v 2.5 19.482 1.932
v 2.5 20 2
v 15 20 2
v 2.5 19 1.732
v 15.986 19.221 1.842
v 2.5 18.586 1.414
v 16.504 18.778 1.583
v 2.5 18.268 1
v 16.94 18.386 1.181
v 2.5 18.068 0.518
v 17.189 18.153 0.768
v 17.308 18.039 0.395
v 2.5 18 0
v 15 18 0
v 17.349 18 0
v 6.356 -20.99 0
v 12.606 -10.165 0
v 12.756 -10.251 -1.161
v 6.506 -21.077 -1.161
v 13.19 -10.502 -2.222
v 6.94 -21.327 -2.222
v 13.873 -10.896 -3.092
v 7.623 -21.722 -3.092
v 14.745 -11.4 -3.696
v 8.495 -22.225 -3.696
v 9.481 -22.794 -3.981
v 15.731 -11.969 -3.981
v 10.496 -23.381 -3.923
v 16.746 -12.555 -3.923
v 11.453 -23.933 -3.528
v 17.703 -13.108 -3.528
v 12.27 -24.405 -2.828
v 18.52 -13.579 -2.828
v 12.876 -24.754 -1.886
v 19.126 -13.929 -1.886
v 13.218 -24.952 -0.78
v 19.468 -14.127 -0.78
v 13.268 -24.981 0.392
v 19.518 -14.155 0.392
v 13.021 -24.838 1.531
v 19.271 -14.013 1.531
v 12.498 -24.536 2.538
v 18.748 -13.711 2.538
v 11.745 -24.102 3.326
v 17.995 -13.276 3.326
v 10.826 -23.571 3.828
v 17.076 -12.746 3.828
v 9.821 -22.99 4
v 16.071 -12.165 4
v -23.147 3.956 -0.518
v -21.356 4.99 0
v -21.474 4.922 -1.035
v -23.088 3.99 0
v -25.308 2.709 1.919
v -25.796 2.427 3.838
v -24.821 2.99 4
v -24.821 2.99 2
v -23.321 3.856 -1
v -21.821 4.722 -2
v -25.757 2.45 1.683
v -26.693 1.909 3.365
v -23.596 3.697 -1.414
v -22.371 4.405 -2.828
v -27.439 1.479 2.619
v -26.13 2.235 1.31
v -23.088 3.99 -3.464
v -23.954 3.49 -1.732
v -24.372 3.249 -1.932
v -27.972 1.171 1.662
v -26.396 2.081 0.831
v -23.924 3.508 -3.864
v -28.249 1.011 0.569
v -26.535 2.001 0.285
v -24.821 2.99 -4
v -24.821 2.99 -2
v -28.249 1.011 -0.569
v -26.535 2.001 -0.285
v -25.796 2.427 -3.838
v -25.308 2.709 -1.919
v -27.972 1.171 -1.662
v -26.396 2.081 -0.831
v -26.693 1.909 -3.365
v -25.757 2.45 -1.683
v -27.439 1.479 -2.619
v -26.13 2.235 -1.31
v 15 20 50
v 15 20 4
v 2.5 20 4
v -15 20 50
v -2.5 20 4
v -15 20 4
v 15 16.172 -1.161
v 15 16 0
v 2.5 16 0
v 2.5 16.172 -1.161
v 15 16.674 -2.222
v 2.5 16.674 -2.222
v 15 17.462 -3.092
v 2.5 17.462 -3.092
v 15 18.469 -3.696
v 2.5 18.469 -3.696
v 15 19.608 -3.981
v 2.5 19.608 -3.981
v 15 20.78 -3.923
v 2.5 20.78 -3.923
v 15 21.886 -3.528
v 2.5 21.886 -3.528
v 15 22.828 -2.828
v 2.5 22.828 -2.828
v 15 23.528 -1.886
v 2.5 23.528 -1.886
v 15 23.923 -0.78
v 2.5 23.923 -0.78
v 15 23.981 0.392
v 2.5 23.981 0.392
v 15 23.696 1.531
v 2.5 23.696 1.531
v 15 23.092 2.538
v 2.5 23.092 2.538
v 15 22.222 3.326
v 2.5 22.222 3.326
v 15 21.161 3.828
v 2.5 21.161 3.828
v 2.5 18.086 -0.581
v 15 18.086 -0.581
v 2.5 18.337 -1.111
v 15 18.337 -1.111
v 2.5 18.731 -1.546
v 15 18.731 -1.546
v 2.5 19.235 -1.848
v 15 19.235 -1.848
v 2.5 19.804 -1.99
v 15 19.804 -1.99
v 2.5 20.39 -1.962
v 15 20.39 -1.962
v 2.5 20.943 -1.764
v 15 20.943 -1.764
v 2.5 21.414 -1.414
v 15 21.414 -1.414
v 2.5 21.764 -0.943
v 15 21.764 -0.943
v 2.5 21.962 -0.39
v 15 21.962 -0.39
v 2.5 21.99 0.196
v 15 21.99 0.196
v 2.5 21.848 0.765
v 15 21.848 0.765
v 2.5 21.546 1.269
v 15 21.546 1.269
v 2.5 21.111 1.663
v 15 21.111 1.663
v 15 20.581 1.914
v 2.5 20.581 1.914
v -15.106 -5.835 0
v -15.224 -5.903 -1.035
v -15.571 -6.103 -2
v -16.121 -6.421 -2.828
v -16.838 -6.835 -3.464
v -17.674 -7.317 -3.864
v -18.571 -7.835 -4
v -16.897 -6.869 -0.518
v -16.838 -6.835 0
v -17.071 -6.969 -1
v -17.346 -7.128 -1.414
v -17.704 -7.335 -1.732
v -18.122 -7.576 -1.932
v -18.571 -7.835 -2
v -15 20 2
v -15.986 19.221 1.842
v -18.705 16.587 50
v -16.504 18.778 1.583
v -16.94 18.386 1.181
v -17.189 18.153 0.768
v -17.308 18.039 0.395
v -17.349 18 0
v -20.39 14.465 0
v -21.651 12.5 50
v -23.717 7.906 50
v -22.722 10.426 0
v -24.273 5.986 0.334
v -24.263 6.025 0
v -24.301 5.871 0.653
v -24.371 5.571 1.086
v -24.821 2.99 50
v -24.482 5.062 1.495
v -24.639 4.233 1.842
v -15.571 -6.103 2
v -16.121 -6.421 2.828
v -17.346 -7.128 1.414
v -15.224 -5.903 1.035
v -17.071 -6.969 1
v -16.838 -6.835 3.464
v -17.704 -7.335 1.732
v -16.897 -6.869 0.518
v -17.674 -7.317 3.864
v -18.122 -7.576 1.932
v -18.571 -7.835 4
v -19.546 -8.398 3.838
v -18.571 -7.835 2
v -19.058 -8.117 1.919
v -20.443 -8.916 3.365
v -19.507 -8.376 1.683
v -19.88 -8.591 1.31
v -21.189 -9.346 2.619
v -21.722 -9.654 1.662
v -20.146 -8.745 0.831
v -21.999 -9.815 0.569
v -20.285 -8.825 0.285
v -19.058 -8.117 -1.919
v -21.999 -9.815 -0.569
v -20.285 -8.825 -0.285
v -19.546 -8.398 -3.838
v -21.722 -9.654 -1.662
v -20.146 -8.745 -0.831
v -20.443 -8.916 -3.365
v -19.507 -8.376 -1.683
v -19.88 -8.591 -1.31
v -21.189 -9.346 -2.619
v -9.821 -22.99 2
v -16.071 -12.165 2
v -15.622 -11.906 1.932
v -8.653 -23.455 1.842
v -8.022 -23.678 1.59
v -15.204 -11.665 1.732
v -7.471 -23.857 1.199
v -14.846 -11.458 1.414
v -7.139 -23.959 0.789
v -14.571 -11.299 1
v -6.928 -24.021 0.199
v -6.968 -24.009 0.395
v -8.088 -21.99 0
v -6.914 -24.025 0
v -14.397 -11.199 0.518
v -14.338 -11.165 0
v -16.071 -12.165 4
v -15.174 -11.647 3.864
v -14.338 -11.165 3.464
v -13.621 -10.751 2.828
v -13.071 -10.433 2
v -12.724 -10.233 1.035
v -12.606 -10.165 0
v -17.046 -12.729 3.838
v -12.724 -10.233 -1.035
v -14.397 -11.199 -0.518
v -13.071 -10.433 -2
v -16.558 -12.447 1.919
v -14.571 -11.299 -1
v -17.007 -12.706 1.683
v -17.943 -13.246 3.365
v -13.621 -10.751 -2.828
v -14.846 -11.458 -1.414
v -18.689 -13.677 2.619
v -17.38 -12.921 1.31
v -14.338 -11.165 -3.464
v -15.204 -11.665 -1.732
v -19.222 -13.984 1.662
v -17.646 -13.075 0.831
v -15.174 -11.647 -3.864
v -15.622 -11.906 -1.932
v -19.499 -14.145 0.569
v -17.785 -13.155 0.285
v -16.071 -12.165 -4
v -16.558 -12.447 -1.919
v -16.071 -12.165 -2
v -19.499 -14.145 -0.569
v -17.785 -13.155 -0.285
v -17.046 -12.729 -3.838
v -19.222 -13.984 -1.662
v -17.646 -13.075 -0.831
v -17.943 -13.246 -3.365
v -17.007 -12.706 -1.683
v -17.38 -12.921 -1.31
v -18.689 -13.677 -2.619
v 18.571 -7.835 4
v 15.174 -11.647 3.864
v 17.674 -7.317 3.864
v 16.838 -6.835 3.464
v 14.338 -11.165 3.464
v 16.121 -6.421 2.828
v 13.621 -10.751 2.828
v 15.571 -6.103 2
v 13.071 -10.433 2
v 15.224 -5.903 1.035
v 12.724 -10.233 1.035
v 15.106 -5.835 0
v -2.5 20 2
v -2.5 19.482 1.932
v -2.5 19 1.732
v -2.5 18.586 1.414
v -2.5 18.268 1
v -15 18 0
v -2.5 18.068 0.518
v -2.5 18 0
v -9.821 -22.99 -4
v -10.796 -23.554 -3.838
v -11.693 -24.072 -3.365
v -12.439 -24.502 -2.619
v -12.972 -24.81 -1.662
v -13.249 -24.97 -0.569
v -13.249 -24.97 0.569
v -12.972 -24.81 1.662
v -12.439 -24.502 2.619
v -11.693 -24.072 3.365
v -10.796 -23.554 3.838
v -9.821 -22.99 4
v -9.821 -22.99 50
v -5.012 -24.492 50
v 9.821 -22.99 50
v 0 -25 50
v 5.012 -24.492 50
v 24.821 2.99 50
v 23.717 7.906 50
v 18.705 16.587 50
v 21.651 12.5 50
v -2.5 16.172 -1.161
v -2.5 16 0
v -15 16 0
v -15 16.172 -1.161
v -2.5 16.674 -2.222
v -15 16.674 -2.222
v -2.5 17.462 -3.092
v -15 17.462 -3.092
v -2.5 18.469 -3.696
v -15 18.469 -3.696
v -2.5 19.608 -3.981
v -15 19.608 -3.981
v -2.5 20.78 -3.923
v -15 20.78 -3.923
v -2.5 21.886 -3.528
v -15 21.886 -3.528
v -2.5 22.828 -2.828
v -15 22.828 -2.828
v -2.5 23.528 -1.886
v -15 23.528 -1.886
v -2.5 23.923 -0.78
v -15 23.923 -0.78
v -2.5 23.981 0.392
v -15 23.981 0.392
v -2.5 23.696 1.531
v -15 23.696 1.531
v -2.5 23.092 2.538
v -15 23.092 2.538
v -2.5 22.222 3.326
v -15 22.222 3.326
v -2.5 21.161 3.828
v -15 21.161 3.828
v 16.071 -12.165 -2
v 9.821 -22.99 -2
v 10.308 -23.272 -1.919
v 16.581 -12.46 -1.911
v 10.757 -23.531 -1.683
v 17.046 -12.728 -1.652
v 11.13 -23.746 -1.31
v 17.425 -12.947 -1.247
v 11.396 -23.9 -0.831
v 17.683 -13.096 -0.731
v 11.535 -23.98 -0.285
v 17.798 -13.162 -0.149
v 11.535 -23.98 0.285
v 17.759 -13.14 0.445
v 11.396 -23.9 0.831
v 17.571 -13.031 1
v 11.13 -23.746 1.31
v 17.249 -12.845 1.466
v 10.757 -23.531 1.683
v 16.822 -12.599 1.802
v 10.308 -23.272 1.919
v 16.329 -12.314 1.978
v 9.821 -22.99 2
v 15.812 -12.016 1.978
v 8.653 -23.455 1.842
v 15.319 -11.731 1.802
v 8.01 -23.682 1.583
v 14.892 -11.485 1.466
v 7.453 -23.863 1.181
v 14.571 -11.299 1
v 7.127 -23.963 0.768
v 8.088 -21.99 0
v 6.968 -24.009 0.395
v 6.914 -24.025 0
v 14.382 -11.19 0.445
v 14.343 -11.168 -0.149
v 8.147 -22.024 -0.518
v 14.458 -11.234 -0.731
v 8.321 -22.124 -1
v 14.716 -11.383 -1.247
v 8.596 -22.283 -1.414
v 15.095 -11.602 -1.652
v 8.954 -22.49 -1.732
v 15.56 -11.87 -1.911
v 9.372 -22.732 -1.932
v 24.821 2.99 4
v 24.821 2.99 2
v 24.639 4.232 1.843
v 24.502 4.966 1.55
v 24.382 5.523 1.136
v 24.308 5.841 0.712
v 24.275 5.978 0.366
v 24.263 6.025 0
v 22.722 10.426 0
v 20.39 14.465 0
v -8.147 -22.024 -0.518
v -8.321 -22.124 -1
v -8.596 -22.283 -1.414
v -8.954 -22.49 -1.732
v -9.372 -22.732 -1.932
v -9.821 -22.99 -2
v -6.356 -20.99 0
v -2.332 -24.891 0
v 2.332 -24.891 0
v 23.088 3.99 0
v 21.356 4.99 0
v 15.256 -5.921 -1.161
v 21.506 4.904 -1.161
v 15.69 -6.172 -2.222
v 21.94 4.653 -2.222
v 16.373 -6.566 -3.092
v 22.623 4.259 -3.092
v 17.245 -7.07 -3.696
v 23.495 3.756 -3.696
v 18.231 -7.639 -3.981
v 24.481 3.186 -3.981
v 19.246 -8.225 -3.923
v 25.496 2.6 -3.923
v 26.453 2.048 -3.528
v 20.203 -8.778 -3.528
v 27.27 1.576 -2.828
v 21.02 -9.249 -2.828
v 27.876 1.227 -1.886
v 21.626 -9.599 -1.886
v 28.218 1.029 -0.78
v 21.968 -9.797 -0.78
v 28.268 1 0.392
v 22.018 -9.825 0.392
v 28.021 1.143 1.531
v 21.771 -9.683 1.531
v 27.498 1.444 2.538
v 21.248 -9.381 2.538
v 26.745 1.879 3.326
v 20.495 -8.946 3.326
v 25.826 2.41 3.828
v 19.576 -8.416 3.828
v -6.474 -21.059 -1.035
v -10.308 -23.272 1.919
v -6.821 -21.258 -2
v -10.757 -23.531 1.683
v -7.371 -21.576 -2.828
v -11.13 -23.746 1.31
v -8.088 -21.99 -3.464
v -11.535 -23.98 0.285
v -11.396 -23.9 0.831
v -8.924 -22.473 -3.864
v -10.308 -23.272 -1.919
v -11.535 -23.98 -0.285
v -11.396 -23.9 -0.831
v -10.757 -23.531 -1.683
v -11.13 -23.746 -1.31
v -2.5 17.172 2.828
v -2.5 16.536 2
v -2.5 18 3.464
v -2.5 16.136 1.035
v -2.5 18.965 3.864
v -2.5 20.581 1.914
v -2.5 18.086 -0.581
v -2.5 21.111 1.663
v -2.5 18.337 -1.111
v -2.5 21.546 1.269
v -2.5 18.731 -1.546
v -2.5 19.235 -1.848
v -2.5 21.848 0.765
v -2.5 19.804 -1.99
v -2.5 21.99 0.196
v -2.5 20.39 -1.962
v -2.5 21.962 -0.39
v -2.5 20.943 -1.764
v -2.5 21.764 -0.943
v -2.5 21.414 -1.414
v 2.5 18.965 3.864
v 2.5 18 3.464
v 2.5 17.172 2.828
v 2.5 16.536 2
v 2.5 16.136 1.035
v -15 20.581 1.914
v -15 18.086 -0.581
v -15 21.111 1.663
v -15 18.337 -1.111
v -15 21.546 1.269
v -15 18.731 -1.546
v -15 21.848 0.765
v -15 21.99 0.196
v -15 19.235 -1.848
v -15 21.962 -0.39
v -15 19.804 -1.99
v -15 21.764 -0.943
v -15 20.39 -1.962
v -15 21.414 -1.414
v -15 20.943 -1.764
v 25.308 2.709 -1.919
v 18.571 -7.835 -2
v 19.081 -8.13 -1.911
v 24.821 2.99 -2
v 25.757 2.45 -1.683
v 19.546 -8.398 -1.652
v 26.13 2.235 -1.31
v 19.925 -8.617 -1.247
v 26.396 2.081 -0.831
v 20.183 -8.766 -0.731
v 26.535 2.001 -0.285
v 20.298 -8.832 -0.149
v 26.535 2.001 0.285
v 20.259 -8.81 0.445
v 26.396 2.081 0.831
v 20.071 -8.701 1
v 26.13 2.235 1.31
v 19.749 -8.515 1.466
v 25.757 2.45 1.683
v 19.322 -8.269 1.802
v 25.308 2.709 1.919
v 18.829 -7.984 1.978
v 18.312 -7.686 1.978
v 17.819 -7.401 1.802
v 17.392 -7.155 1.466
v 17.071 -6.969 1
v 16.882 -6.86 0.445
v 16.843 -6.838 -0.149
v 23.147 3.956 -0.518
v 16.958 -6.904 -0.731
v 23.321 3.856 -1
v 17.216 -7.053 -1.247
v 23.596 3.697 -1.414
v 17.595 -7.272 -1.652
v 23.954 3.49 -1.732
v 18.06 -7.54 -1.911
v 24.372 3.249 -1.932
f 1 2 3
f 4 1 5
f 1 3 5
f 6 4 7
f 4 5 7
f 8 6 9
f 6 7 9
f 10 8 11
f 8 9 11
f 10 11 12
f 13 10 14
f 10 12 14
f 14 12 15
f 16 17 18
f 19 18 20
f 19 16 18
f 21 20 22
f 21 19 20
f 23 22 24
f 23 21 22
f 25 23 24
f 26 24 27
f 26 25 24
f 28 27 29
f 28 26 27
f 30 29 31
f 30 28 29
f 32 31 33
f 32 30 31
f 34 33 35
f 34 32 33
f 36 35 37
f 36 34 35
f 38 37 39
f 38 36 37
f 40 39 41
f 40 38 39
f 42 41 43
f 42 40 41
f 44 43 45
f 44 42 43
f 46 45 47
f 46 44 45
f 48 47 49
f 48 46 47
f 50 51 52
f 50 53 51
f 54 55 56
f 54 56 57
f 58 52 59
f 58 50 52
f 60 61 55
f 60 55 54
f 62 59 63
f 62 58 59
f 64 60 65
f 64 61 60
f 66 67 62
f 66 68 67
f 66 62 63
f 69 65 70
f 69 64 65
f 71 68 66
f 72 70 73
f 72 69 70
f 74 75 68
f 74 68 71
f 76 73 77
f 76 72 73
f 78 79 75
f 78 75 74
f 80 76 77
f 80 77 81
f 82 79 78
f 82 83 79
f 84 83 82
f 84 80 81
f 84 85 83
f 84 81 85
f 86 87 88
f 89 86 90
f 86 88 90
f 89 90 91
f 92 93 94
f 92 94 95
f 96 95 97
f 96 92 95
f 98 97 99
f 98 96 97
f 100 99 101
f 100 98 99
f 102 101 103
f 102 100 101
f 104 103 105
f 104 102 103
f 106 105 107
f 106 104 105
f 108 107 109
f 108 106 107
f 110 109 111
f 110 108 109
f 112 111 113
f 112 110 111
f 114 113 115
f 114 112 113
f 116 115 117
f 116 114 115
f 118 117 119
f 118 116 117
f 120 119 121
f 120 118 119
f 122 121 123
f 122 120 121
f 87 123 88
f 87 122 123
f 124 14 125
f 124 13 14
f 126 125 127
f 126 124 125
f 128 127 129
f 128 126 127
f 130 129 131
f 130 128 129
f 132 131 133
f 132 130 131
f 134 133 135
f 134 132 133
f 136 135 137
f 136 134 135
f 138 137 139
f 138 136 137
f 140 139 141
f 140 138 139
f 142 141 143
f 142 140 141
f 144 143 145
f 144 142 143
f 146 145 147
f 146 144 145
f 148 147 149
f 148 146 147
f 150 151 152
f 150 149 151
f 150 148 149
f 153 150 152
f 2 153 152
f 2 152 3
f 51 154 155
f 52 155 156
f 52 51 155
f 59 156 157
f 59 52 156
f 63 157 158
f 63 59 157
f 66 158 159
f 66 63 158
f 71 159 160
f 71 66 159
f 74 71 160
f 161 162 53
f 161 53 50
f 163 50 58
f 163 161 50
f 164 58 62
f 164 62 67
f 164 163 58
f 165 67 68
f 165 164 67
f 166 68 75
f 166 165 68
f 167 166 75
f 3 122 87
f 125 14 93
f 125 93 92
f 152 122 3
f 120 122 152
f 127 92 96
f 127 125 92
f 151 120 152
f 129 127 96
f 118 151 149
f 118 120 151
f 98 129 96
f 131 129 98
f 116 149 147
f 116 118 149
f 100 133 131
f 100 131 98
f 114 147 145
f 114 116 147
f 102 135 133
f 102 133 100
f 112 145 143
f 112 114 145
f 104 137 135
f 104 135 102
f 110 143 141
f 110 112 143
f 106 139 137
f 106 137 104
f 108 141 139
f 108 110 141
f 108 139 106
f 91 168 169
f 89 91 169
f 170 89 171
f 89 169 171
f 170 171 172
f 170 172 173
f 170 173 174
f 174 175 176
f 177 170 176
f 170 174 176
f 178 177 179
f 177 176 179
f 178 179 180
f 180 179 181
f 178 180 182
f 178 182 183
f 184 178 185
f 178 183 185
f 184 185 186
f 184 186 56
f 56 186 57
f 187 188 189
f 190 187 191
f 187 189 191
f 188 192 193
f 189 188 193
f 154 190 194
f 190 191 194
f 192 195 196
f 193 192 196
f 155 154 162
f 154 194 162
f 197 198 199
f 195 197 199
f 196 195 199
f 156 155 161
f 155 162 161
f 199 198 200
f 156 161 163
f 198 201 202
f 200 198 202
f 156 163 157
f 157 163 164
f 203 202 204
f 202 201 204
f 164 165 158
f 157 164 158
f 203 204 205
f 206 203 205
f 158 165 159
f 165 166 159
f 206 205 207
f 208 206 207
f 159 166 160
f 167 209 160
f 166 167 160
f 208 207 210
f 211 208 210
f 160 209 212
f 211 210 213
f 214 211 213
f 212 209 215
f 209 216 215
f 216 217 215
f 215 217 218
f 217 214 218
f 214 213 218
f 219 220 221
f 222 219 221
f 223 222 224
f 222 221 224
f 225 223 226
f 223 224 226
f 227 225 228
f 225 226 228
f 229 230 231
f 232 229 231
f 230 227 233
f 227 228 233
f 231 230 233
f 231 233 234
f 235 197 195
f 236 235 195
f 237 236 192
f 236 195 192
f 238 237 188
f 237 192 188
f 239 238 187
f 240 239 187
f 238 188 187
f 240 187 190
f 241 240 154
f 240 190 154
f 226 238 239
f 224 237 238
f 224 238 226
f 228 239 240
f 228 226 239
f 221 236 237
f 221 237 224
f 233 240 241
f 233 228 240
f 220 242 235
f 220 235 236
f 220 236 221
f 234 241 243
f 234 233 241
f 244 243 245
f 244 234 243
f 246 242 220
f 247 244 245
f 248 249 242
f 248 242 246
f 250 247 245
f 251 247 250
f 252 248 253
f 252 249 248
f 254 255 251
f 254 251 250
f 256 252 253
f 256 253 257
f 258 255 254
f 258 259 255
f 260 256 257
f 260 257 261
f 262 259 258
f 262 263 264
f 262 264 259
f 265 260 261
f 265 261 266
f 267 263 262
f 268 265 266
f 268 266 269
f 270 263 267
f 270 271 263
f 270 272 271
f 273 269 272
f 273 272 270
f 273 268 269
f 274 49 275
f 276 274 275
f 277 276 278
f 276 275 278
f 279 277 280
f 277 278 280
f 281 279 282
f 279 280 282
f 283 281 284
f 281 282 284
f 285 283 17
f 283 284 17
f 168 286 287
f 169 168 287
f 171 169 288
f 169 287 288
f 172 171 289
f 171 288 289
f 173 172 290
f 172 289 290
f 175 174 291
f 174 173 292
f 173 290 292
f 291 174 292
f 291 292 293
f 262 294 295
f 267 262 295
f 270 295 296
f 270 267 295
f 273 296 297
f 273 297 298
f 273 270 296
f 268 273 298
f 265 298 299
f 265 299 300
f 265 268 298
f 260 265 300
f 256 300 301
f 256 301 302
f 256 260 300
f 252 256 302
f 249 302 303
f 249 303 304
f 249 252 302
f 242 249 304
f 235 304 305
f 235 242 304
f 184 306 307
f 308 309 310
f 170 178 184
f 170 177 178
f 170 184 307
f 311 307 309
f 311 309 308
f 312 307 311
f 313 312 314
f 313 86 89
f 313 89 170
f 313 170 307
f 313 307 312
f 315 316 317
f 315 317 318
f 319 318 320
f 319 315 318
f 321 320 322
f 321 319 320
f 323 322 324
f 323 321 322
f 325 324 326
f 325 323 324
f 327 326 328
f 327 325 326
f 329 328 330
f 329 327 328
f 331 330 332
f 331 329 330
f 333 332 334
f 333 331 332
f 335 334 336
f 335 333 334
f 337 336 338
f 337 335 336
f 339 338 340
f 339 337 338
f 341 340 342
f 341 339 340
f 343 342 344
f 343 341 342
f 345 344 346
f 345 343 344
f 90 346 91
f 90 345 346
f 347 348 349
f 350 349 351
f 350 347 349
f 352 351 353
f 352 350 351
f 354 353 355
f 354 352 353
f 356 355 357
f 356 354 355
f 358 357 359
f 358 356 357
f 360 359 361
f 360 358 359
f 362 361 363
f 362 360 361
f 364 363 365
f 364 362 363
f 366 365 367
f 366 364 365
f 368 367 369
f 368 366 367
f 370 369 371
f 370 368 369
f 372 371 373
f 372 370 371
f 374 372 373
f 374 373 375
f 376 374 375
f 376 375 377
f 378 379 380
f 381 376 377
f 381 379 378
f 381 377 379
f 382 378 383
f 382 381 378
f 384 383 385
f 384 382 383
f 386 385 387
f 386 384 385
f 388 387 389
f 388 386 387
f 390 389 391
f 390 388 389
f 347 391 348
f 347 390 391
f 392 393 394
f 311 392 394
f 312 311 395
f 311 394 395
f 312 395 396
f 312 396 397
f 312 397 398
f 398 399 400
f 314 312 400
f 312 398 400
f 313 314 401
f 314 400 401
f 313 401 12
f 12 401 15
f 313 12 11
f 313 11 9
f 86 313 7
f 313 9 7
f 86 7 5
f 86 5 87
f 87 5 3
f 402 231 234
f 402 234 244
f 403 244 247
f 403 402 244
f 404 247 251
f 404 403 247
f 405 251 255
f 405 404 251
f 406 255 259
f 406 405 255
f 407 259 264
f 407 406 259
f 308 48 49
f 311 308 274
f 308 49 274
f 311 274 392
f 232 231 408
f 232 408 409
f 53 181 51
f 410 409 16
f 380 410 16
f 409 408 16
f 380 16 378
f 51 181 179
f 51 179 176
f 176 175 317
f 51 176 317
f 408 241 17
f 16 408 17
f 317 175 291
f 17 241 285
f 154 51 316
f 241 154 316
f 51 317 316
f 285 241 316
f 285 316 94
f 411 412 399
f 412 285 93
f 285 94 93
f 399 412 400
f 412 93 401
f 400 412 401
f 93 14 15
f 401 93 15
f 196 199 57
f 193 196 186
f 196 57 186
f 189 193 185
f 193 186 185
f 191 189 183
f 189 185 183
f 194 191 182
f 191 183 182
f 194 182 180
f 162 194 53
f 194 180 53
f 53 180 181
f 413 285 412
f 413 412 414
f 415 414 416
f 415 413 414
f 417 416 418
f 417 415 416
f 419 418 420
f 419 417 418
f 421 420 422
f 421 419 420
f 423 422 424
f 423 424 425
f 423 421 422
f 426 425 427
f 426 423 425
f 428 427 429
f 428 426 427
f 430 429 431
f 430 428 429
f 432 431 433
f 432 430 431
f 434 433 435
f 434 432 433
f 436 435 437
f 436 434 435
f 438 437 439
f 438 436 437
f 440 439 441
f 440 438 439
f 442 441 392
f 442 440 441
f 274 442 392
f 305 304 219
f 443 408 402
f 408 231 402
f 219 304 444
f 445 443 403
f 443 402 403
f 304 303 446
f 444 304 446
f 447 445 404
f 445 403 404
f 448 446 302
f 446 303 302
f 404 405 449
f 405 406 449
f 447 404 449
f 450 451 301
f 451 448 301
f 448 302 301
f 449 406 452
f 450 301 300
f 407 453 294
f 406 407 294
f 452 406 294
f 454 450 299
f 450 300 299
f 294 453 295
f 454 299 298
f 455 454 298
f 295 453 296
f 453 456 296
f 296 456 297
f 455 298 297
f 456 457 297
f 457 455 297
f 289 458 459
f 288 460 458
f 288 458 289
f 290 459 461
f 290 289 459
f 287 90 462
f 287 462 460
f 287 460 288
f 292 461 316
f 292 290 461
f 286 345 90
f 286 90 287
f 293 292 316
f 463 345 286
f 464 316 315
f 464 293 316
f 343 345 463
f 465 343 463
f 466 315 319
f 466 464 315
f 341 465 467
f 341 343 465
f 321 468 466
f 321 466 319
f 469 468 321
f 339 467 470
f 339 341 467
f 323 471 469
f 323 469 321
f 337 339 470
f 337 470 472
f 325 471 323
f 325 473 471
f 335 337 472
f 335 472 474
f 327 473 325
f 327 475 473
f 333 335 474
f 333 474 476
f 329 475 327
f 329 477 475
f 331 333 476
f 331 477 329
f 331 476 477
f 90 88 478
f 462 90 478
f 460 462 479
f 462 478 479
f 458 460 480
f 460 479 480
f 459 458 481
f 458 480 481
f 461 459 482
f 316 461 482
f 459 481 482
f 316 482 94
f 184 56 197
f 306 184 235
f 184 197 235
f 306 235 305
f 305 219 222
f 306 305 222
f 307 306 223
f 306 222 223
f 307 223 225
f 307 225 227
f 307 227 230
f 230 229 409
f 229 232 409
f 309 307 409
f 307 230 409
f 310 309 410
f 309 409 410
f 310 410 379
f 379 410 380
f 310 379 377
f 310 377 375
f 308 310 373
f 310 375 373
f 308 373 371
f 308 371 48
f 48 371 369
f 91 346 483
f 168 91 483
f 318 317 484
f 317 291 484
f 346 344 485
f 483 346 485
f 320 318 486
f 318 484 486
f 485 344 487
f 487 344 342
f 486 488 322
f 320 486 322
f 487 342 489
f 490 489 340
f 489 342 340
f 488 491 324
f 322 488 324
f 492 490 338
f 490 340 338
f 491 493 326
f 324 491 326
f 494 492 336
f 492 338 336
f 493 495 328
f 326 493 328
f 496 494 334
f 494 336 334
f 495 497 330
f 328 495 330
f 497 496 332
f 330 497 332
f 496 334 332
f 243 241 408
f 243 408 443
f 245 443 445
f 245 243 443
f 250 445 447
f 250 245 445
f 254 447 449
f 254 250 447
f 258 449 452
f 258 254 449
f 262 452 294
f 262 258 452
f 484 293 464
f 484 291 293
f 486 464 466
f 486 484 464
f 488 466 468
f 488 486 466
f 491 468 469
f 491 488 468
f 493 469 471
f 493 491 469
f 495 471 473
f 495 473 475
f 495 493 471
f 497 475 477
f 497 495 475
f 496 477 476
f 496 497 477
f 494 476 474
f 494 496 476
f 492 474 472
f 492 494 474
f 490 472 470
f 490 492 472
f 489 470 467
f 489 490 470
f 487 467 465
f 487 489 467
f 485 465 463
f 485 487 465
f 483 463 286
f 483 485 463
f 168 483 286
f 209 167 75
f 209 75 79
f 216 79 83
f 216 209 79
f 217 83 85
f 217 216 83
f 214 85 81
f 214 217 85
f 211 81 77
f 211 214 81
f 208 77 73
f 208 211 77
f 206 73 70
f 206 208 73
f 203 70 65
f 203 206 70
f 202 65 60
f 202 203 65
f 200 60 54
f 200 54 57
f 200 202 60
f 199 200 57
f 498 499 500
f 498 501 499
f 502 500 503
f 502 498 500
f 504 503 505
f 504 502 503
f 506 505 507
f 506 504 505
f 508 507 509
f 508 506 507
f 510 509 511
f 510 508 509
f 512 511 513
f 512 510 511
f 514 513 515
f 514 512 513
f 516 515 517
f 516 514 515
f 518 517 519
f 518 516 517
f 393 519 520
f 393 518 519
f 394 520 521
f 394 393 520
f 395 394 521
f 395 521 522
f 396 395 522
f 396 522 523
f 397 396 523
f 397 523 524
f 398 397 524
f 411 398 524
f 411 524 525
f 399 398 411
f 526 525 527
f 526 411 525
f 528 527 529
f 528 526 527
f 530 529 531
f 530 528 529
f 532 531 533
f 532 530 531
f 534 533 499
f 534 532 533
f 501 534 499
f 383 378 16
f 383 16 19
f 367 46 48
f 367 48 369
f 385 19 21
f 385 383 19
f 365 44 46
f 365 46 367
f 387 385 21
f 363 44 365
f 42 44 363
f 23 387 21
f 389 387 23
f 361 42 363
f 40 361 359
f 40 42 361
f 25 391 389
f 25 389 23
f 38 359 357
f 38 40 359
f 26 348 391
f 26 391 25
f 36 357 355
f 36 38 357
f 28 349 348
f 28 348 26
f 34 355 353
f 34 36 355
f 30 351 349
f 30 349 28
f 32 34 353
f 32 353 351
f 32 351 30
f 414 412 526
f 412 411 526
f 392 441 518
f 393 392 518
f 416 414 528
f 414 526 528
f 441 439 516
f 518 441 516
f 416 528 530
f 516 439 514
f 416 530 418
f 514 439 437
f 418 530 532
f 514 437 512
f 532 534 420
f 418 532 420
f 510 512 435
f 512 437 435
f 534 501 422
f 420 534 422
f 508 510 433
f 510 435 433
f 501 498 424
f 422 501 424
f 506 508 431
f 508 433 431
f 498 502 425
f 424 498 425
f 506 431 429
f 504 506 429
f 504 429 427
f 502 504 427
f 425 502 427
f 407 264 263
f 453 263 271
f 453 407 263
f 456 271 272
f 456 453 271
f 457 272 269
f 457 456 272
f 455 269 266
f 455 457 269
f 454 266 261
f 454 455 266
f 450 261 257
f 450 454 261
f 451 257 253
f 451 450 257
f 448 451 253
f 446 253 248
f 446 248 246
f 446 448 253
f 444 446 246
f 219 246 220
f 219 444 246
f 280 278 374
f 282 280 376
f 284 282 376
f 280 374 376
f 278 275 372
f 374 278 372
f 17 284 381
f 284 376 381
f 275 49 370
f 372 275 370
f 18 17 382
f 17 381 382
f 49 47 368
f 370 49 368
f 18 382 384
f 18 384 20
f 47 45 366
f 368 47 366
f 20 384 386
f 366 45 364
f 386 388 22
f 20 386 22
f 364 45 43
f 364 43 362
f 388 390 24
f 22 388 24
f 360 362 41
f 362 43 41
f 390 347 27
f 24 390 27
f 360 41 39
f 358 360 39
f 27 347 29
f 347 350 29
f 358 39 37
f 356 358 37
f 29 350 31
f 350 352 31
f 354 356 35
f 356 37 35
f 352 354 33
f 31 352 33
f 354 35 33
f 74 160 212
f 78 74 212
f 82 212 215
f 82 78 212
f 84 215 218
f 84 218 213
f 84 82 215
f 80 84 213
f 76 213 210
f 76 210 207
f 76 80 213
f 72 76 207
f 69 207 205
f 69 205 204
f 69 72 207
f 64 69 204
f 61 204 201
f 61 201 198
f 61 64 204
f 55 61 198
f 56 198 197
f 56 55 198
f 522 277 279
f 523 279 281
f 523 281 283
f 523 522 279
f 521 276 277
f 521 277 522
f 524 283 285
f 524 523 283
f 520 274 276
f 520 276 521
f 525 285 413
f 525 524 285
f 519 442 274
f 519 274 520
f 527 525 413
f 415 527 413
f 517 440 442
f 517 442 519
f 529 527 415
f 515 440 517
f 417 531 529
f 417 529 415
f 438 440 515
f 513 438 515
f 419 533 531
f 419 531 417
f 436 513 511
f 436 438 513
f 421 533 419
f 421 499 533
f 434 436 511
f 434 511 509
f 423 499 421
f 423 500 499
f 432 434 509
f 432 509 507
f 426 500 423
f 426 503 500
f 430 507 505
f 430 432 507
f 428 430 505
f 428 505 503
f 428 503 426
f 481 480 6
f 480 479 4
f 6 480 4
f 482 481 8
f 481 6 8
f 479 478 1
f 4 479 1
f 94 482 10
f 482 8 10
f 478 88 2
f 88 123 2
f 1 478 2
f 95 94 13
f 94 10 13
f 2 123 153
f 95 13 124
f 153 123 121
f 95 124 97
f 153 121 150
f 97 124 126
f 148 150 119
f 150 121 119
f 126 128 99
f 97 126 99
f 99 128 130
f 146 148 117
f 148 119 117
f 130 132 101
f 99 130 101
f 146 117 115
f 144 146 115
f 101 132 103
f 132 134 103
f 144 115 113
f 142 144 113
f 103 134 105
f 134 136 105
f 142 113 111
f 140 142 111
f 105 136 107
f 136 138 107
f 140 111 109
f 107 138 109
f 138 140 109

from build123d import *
from build123d.topology import SkipClean

# Parameters (mm, degrees)
CROQUIS1_R              = 25
SALIENTE_EXTRUIR1_DEPTH = 50
CORTAR_EXTRUIR1_DEPTH   = 50
MATRIZC2_COUNT          = 3
CROQUIS4_R              = 4
CROQUIS4_R_2            = 2
SALIENTE_EXTRUIR2_DEPTH = 15
CROQUIS4_2_R            = 2
CORTAR_EXTRUIR3_DEPTH   = 20
MATRIZC3_COUNT          = 3
MATRIZC4_COUNT          = 3
CROQUIS4_3_R            = 4
CROQUIS4_3_R_2          = 2
CORTAR_EXTRUIR4_DEPTH   = 2.5
MATRIZC5_COUNT          = 3


with BuildPart() as part:
    # Croquis1 → Saliente-Extruir1 (new body)
    with BuildSketch(Plane.XY):
        Circle(CROQUIS1_R)
    extrude(amount=SALIENTE_EXTRUIR1_DEPTH)

    # Croquis2 → Cortar-Extruir1 (cut)
    with BuildSketch(Plane(origin=(0, 0, 0), x_dir=(-1, 0, 0), z_dir=(0, 0, -1))):
        with BuildLine():
            Line((-15, 20), (15, 20))
            ThreePointArc((15, 20), (0, 25), (-15, 20))
        make_face()
    cortar_extruir1 = extrude(amount=-CORTAR_EXTRUIR1_DEPTH, mode=Mode.SUBTRACT)

    # MatrizC2: Cortar-Extruir1 ×3 about axis
    matrizc2_axis = Axis((0, 0, 0), (0, 0, 1))
    for i in range(1, MATRIZC2_COUNT):
        add(cortar_extruir1.rotate(matrizc2_axis, i * 360 / MATRIZC2_COUNT), mode=Mode.SUBTRACT)

    # Croquis4 → Saliente-Extruir2 (add, symmetric)
    with BuildSketch(Plane(origin=(0, 0, 0), x_dir=(0, 0, -1), z_dir=(1, 0, 0))):
        with Locations((0, 20)):
            Circle(CROQUIS4_R)
        with Locations((0, 20)):
            Circle(CROQUIS4_R_2, mode=Mode.SUBTRACT)
    saliente_extruir2 = extrude(amount=SALIENTE_EXTRUIR2_DEPTH, both=True)

    # Croquis4<2> → Cortar-Extruir3 (cut, symmetric)
    with SkipClean():  # the faces are left unmerged after this step: merging them gives an invalid solid
        with BuildSketch(Plane(origin=(0, 0, 0), x_dir=(0, 0, -1), z_dir=(1, 0, 0))):
            with Locations(Location((0, 20, 0), (0, 0, 180))):
                Circle(CROQUIS4_2_R)
        cortar_extruir3 = extrude(amount=CORTAR_EXTRUIR3_DEPTH, both=True, mode=Mode.SUBTRACT)

    # MatrizC3: Saliente-Extruir2 ×3 about axis
    with SkipClean():  # the faces are left unmerged after this step: merging them gives an invalid solid
        matrizc3_axis = Axis((0, 0, 0), (0, 0, 1))
        for i in range(1, MATRIZC3_COUNT):
            add(saliente_extruir2.rotate(matrizc3_axis, i * 360 / MATRIZC3_COUNT))

    # MatrizC4: Cortar-Extruir3 ×3 about axis
    with SkipClean():  # the faces are left unmerged after this step: merging them gives an invalid solid
        matrizc4_axis = Axis((0, 0, 50), (0, 0, -1))
        for i in range(1, MATRIZC4_COUNT):
            add(cortar_extruir3.rotate(matrizc4_axis, i * 360 / MATRIZC4_COUNT), mode=Mode.SUBTRACT)

    # Croquis4<3> → Cortar-Extruir4 (cut, symmetric)
    with BuildSketch(Plane(origin=(0, 0, 0), x_dir=(0, 0, -1), z_dir=(1, 0, 0))):
        with Locations((0, 20)):
            Circle(CROQUIS4_3_R)
        with Locations(Location((0, 20, 0), (0, 0, 180))):
            Circle(CROQUIS4_3_R_2, mode=Mode.SUBTRACT)
    cortar_extruir4 = extrude(amount=CORTAR_EXTRUIR4_DEPTH, both=True, mode=Mode.SUBTRACT)

    # MatrizC5: Cortar-Extruir4 ×3 about axis
    matrizc5_axis = Axis((0, 0, 0), (0, 0, 1))
    for i in range(1, MATRIZC5_COUNT):
        add(cortar_extruir4.rotate(matrizc5_axis, i * 360 / MATRIZC5_COUNT), mode=Mode.SUBTRACT)


solid = part.part
